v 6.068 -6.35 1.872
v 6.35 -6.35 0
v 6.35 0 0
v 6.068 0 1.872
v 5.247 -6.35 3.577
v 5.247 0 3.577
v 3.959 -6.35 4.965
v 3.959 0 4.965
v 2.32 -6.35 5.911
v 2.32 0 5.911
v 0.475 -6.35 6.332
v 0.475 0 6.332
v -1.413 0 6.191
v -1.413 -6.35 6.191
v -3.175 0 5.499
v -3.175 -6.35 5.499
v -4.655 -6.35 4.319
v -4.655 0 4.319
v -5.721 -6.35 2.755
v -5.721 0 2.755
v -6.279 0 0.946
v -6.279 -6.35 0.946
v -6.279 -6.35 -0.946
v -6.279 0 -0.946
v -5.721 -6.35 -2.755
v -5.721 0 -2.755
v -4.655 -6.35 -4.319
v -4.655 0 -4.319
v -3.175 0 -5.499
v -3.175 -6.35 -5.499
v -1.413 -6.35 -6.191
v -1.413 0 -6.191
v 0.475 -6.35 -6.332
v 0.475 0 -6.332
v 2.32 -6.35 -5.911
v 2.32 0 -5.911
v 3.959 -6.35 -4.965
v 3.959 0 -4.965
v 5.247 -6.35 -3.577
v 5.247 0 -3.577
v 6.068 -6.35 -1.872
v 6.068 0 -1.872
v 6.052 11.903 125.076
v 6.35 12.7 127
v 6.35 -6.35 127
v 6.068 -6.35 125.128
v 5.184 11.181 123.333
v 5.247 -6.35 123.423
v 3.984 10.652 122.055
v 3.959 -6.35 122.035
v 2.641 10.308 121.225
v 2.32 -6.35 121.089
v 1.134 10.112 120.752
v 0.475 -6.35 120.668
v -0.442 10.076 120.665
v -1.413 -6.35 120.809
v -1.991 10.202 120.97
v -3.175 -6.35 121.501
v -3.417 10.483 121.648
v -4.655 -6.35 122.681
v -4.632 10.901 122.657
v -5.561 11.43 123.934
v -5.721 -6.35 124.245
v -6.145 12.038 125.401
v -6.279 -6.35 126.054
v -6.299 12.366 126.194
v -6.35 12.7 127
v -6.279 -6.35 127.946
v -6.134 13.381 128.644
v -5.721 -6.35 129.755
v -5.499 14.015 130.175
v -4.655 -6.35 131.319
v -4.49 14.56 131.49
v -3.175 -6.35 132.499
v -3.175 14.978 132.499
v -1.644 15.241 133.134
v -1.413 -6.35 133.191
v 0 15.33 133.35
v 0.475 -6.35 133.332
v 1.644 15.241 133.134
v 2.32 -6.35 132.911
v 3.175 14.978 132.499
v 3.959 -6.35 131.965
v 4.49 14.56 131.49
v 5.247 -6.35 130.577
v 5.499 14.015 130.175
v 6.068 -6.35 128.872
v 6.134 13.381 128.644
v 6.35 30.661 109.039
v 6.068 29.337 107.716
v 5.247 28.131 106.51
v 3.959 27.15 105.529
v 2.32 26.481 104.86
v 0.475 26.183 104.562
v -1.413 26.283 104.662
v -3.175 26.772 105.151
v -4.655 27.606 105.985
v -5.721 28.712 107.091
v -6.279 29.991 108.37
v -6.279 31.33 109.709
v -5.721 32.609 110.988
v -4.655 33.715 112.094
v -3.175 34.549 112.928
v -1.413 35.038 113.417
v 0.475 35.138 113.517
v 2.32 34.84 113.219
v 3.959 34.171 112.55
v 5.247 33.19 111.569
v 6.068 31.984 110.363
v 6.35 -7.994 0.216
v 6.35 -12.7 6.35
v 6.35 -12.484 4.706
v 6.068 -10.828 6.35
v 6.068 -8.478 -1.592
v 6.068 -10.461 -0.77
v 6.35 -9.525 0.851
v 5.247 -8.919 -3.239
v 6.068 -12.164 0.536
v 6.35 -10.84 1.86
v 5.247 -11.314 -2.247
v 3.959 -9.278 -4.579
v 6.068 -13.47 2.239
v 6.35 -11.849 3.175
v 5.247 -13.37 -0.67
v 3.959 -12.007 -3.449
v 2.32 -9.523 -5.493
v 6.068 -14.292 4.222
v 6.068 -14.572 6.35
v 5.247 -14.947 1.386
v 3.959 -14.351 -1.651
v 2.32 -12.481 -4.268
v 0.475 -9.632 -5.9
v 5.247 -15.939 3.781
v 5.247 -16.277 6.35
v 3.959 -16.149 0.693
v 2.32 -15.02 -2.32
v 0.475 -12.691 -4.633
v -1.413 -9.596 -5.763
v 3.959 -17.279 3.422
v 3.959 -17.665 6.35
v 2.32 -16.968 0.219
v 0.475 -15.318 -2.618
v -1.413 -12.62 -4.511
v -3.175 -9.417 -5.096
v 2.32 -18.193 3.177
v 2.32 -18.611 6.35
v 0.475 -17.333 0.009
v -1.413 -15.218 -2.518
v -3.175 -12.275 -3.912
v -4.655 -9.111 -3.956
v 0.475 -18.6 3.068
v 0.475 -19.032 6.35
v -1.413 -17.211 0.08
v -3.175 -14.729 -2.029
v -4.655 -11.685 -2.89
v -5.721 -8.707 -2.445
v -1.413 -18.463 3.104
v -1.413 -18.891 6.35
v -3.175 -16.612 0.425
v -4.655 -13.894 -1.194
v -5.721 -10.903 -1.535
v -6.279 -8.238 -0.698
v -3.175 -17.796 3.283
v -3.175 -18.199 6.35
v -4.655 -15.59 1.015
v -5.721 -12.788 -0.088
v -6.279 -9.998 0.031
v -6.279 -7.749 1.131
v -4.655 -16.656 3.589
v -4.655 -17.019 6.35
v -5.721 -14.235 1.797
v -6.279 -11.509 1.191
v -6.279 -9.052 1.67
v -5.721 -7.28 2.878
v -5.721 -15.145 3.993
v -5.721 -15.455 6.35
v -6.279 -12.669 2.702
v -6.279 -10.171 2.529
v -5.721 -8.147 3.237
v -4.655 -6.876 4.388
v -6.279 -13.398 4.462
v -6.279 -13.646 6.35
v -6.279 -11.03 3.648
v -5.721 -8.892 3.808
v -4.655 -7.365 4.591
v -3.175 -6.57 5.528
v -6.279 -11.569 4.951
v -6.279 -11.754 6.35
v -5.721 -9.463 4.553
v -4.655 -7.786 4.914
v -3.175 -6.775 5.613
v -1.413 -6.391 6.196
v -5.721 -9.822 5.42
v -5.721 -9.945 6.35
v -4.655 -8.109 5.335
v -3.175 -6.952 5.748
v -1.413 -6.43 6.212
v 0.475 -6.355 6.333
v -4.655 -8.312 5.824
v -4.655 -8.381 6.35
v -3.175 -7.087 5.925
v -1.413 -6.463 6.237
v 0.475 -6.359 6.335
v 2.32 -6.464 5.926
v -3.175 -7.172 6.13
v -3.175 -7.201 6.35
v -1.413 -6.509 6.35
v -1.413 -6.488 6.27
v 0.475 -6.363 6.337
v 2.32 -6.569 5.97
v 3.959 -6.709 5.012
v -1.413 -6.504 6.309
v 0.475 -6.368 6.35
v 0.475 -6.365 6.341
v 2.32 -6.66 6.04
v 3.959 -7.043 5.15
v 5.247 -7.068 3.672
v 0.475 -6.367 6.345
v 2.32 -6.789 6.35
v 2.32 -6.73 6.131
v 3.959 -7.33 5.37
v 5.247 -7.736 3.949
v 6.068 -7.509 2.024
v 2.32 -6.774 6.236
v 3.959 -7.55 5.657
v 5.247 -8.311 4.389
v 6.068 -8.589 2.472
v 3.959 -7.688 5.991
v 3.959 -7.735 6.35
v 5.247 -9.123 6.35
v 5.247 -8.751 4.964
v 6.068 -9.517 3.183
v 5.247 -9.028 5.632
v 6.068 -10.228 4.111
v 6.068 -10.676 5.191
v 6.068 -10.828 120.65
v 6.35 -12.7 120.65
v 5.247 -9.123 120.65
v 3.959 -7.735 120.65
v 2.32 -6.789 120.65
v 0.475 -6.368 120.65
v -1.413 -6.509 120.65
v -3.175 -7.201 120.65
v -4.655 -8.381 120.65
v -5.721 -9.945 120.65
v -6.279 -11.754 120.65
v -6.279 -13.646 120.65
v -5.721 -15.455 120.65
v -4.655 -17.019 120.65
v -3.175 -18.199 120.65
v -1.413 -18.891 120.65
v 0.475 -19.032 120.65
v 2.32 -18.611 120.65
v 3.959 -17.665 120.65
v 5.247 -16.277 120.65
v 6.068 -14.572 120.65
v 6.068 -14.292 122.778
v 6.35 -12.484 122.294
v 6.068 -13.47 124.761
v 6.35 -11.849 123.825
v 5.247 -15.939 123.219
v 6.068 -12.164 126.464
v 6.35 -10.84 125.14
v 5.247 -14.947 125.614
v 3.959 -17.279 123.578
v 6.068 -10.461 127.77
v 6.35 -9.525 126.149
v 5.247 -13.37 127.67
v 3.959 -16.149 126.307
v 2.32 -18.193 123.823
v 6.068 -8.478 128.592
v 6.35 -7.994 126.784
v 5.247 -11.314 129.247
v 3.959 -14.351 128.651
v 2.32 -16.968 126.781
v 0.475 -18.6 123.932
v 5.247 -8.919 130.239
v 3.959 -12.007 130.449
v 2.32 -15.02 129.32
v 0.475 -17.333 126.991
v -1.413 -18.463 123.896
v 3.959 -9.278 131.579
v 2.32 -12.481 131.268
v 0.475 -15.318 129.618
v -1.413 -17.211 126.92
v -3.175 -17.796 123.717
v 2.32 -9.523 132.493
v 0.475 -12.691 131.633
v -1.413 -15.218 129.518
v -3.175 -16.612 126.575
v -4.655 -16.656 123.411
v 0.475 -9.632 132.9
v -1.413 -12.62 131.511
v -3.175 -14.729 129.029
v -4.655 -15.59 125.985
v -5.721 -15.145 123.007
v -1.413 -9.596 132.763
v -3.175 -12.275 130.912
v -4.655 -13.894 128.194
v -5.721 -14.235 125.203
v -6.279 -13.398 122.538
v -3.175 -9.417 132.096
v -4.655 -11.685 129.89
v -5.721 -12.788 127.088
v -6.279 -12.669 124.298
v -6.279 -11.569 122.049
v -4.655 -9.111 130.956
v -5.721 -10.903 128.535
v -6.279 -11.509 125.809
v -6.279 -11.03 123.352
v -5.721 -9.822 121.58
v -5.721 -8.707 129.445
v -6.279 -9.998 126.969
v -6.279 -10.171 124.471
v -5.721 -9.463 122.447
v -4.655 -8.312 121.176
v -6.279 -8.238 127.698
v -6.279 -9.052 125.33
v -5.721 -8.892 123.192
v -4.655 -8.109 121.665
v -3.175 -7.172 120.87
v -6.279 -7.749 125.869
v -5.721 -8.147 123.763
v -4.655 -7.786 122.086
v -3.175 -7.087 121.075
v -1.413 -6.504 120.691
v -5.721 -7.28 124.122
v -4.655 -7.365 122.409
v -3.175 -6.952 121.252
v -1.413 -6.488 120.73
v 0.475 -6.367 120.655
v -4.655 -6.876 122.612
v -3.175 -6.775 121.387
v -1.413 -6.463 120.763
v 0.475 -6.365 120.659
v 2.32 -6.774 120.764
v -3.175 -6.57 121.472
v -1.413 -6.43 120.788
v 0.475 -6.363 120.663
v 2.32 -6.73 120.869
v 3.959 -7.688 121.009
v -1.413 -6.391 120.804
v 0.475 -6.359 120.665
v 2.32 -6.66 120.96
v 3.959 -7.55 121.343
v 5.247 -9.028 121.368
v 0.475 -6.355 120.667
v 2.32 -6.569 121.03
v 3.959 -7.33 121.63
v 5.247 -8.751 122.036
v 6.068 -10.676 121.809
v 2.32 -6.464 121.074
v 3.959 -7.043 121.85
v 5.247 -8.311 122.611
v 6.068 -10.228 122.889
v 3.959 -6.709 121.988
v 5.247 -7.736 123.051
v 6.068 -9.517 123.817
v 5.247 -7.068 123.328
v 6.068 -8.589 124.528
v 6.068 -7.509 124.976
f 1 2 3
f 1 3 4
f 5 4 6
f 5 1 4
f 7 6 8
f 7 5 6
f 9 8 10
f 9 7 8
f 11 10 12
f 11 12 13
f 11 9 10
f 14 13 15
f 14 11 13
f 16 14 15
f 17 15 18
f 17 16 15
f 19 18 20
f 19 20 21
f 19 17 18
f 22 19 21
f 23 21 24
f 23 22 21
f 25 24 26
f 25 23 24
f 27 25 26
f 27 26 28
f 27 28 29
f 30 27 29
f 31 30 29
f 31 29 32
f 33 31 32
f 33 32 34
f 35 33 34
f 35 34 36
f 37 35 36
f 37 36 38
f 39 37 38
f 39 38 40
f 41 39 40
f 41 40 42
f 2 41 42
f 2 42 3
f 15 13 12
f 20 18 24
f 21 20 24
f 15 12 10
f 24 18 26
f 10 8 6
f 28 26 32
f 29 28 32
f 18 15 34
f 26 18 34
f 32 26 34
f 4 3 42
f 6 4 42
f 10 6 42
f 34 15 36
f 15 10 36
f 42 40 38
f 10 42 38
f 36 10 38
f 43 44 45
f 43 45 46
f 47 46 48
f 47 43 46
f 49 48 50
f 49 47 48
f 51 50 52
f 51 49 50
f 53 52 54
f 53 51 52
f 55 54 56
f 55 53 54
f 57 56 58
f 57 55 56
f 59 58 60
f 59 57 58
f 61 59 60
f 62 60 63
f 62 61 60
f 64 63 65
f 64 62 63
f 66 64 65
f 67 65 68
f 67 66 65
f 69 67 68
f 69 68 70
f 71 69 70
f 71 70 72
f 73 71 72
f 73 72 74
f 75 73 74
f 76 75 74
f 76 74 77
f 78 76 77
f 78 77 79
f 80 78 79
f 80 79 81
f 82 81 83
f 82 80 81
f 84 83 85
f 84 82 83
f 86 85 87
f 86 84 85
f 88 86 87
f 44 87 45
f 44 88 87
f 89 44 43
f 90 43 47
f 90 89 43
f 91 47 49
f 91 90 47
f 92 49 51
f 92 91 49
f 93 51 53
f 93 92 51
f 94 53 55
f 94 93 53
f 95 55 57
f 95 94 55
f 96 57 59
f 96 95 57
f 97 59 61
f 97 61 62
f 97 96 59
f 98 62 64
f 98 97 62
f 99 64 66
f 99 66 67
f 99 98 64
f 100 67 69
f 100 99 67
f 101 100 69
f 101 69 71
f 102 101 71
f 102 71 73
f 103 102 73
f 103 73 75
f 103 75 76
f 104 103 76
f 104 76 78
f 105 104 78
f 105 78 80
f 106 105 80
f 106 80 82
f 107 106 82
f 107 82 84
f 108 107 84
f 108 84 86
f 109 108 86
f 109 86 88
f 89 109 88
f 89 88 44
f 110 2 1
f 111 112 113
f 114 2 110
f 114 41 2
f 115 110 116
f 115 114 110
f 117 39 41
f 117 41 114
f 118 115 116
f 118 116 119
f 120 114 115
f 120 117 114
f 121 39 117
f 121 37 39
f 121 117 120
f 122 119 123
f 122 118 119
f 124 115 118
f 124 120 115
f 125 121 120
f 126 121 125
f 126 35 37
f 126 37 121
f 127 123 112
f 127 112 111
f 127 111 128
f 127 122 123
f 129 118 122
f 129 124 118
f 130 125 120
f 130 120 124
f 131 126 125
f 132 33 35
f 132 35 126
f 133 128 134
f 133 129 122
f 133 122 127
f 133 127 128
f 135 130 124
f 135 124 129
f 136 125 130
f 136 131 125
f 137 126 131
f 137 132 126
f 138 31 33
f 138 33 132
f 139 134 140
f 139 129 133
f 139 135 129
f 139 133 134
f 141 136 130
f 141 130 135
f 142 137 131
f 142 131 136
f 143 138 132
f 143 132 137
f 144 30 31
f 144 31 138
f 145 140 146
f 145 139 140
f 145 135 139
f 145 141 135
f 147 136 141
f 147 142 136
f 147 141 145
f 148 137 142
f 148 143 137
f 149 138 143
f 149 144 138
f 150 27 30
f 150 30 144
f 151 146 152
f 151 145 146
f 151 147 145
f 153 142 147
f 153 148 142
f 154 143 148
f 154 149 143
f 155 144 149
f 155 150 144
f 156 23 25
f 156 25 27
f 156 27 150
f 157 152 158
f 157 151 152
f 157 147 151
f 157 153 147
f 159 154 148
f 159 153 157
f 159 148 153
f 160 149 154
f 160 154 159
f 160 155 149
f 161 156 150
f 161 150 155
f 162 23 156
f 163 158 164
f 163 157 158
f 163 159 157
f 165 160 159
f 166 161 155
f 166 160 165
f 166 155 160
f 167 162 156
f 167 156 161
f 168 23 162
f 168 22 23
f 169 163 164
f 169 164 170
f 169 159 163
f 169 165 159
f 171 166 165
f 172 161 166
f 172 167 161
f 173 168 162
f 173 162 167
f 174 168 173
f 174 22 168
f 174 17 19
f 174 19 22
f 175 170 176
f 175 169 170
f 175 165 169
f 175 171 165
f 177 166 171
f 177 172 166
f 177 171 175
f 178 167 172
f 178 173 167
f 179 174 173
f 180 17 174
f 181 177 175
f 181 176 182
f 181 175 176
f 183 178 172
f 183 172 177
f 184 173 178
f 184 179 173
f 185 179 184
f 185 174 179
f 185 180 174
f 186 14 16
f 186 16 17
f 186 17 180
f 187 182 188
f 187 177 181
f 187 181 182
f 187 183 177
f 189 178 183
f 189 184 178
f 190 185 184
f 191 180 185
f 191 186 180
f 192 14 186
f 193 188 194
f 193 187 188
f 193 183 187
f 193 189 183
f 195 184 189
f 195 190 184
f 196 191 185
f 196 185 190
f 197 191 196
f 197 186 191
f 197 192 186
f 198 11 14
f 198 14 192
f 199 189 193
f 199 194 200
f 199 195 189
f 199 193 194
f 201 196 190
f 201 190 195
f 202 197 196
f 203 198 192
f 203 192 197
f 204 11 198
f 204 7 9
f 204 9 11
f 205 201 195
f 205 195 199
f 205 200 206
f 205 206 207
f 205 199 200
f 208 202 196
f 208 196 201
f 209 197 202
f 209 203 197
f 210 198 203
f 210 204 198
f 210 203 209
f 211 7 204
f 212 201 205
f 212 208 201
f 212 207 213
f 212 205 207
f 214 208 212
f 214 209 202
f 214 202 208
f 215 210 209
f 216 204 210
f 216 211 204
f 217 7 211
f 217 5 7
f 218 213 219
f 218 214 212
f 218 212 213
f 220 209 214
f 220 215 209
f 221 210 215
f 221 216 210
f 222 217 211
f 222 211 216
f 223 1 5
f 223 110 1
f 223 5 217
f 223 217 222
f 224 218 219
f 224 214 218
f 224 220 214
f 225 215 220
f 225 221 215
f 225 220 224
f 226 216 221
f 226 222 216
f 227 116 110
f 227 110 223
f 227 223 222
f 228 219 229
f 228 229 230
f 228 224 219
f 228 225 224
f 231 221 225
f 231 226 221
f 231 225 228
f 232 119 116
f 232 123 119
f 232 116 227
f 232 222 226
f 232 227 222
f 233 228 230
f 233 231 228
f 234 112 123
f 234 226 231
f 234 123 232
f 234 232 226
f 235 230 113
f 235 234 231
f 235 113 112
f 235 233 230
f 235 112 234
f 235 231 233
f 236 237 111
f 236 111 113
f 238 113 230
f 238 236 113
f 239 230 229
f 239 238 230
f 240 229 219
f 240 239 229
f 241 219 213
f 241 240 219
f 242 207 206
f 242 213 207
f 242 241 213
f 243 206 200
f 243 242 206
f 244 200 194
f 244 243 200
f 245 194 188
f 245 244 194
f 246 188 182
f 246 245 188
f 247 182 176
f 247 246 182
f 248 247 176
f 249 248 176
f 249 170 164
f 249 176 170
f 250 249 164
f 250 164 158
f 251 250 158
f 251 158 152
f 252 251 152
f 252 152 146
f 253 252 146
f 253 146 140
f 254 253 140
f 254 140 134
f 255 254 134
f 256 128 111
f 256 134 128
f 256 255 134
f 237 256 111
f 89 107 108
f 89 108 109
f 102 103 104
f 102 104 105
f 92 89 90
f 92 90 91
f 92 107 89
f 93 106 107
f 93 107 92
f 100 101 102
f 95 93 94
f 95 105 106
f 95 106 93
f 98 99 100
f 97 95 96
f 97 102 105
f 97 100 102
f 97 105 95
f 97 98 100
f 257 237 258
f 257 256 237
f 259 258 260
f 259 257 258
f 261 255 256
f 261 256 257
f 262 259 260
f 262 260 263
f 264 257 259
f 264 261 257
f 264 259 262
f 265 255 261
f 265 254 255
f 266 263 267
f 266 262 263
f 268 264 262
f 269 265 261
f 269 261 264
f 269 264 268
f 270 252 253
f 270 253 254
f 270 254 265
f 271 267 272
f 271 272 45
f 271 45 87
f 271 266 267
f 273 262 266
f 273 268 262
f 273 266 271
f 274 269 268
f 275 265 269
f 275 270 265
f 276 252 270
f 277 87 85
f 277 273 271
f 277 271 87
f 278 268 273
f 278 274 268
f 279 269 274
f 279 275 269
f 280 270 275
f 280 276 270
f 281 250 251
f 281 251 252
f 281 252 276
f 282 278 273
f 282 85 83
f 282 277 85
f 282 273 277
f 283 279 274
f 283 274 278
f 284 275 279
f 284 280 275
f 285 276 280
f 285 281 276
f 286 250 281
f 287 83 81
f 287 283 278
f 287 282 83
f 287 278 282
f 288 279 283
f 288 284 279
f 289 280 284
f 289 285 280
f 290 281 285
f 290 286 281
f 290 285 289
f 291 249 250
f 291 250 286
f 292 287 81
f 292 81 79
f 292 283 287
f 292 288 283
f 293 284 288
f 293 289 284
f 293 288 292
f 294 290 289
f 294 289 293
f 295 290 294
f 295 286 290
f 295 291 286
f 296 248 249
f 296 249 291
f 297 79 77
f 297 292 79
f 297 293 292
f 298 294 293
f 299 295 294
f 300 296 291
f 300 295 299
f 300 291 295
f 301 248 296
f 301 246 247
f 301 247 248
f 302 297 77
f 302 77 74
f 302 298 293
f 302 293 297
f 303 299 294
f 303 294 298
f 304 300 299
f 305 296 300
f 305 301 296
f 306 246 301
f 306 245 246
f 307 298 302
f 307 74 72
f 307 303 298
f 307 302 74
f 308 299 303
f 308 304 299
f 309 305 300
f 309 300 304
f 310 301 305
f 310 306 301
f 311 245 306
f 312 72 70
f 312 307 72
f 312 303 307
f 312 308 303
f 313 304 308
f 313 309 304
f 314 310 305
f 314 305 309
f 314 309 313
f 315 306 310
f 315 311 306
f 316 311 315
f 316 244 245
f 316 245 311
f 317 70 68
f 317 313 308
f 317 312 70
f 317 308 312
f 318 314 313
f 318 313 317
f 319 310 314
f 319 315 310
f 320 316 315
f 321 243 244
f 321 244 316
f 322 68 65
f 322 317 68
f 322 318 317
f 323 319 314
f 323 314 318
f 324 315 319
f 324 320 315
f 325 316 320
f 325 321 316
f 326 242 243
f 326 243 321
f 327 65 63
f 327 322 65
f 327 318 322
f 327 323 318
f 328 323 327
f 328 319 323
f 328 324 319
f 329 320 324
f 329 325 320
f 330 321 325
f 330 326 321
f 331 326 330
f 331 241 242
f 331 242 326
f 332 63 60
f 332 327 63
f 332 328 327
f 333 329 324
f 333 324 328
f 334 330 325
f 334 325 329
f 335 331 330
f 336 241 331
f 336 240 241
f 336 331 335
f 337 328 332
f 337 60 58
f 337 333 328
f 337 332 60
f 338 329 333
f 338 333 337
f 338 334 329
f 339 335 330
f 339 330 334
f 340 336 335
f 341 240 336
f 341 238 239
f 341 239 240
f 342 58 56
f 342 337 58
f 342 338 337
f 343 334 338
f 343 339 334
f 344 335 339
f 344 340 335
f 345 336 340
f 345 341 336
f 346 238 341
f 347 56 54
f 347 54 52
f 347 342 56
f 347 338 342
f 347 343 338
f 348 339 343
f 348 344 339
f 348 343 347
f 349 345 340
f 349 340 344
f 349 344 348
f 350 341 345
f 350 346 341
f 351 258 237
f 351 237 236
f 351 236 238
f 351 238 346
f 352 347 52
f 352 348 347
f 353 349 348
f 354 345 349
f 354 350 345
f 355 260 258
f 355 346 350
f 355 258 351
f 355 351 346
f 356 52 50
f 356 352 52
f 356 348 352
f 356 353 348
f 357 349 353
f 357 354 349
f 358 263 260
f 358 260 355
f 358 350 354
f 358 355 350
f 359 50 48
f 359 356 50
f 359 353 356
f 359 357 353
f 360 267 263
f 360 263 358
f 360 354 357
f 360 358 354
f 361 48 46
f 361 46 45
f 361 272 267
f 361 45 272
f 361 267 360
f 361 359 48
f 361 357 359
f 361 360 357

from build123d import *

# Parameters (mm, degrees)
F0_R = 6.35


with BuildPart() as f2:
    # F2: sweep along a path in F1
    with BuildLine(Plane.YZ) as f2_path:
        Line((0, 0), (-6.35, 0))
        ThreePointArc((-6.35, 0), (-10.8401280605, 1.8598719395), (-12.7, 6.35))
        Line((-12.7, 6.35), (-12.7, 120.65))
        ThreePointArc((-12.7, 120.65), (-10.8401280605, 125.1401280605), (-6.35, 127))
        Line((-6.35, 127), (12.7, 127))
        Line((12.7, 127), (30.6605122421, 109.0394877579))
    # F0 (on Front) → F2 (sweep)
    with BuildSketch(Plane.XZ):
        Circle(F0_R)
    sweep(path=f2_path.line, transition=Transition.RIGHT)


solid = f2.part
